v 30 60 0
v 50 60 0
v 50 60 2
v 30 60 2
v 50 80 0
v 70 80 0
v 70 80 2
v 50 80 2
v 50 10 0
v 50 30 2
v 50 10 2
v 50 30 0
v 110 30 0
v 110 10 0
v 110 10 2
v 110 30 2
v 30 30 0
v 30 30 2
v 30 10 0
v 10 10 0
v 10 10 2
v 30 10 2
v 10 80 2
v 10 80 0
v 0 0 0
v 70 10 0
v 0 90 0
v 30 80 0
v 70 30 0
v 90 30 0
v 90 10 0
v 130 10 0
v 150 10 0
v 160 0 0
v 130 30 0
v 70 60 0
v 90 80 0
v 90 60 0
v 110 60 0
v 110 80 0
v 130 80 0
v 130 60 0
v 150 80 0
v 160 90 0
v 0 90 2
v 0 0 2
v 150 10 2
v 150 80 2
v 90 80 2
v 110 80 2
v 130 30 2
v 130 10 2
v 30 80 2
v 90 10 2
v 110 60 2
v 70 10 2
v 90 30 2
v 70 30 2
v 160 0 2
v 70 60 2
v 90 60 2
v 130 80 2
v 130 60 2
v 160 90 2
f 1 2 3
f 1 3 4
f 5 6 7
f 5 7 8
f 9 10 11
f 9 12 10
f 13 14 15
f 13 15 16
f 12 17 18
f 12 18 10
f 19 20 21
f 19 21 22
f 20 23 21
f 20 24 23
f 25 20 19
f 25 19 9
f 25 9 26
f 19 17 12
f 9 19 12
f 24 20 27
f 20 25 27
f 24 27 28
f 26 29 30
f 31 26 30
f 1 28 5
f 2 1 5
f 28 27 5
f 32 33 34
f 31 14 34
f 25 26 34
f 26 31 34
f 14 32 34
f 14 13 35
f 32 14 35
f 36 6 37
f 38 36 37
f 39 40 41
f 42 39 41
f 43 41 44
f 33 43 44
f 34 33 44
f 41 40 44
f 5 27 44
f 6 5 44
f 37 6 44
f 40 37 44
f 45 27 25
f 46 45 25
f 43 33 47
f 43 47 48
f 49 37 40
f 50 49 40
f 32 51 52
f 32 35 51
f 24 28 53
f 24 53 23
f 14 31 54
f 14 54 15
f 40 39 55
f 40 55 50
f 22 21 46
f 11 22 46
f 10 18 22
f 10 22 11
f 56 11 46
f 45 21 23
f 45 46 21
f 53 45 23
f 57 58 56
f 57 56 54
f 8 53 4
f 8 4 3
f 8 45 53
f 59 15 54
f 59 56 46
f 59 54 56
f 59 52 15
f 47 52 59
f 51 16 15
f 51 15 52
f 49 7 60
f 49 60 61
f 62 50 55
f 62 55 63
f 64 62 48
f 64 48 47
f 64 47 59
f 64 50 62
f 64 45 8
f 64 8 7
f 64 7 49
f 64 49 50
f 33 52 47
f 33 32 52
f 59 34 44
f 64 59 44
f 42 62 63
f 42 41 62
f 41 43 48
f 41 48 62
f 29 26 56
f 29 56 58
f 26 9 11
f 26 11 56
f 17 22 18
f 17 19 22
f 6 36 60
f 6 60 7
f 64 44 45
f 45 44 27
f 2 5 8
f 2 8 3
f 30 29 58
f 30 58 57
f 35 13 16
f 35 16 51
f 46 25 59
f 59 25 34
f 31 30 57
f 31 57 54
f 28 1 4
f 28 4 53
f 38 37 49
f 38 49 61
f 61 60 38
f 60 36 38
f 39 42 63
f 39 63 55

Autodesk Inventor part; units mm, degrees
ref_plane "YZ Plane" through (0, 0, 0) normal (1, 0, 0) x (0, 1, 0)
ref_plane "XZ Plane" through (0, 0, 0) normal (0, 1, 0) x (-1, 0, 0)
ref_plane "XY Plane" through (0, 0, 0) normal (0, 0, 1) x (1, 0, 0)
sketch "Sketch1" plane through (0, 0, 0) normal (0, 0, 1) x (1, 0, 0)
  line L0 (0, 0) -> (160, 0)
  line L1 (160, 0) -> (160, 90)
  line L2 (160, 90) -> (0, 90)
  line L3 (0, 90) -> (0, 0)
  line L4 (10, 10) -> (30, 10)
  line L5 (30, 10) -> (30, 30)
  line L6 (30, 30) -> (50, 30)
  line L7 (50, 30) -> (50, 10)
  line L8 (50, 10) -> (70, 10)
  line L9 (70, 10) -> (70, 30)
  line L10 (70, 30) -> (90, 30)
  line L11 (90, 30) -> (90, 10)
  line L12 (90, 10) -> (110, 10)
  line L13 (110, 10) -> (110, 30)
  line L14 (110, 30) -> (130, 30)
  line L15 (130, 30) -> (130, 10)
  line L16 (130, 10) -> (150, 10)
  line L17 (150, 10) -> (150, 80)
  line L18 (150, 80) -> (130, 80)
  line L19 (130, 80) -> (130, 60)
  line L20 (130, 60) -> (110, 60)
  line L21 (110, 60) -> (110, 80)
  line L22 (90, 80) -> (110, 80)
  line L23 (90, 80) -> (90, 60)
  line L24 (70, 60) -> (90, 60)
  line L25 (70, 60) -> (70, 80)
  line L26 (70, 80) -> (50, 80)
  line L27 (50, 80) -> (50, 60)
  line L28 (50, 60) -> (30, 60)
  line L29 (30, 60) -> (30, 80)
  line L30 (30, 80) -> (10, 80)
  line L31 (10, 80) -> (10, 10)
extrude "Extrusion1" add sketch "Sketch1" along normal blind 2
properties part number "P2-4"
